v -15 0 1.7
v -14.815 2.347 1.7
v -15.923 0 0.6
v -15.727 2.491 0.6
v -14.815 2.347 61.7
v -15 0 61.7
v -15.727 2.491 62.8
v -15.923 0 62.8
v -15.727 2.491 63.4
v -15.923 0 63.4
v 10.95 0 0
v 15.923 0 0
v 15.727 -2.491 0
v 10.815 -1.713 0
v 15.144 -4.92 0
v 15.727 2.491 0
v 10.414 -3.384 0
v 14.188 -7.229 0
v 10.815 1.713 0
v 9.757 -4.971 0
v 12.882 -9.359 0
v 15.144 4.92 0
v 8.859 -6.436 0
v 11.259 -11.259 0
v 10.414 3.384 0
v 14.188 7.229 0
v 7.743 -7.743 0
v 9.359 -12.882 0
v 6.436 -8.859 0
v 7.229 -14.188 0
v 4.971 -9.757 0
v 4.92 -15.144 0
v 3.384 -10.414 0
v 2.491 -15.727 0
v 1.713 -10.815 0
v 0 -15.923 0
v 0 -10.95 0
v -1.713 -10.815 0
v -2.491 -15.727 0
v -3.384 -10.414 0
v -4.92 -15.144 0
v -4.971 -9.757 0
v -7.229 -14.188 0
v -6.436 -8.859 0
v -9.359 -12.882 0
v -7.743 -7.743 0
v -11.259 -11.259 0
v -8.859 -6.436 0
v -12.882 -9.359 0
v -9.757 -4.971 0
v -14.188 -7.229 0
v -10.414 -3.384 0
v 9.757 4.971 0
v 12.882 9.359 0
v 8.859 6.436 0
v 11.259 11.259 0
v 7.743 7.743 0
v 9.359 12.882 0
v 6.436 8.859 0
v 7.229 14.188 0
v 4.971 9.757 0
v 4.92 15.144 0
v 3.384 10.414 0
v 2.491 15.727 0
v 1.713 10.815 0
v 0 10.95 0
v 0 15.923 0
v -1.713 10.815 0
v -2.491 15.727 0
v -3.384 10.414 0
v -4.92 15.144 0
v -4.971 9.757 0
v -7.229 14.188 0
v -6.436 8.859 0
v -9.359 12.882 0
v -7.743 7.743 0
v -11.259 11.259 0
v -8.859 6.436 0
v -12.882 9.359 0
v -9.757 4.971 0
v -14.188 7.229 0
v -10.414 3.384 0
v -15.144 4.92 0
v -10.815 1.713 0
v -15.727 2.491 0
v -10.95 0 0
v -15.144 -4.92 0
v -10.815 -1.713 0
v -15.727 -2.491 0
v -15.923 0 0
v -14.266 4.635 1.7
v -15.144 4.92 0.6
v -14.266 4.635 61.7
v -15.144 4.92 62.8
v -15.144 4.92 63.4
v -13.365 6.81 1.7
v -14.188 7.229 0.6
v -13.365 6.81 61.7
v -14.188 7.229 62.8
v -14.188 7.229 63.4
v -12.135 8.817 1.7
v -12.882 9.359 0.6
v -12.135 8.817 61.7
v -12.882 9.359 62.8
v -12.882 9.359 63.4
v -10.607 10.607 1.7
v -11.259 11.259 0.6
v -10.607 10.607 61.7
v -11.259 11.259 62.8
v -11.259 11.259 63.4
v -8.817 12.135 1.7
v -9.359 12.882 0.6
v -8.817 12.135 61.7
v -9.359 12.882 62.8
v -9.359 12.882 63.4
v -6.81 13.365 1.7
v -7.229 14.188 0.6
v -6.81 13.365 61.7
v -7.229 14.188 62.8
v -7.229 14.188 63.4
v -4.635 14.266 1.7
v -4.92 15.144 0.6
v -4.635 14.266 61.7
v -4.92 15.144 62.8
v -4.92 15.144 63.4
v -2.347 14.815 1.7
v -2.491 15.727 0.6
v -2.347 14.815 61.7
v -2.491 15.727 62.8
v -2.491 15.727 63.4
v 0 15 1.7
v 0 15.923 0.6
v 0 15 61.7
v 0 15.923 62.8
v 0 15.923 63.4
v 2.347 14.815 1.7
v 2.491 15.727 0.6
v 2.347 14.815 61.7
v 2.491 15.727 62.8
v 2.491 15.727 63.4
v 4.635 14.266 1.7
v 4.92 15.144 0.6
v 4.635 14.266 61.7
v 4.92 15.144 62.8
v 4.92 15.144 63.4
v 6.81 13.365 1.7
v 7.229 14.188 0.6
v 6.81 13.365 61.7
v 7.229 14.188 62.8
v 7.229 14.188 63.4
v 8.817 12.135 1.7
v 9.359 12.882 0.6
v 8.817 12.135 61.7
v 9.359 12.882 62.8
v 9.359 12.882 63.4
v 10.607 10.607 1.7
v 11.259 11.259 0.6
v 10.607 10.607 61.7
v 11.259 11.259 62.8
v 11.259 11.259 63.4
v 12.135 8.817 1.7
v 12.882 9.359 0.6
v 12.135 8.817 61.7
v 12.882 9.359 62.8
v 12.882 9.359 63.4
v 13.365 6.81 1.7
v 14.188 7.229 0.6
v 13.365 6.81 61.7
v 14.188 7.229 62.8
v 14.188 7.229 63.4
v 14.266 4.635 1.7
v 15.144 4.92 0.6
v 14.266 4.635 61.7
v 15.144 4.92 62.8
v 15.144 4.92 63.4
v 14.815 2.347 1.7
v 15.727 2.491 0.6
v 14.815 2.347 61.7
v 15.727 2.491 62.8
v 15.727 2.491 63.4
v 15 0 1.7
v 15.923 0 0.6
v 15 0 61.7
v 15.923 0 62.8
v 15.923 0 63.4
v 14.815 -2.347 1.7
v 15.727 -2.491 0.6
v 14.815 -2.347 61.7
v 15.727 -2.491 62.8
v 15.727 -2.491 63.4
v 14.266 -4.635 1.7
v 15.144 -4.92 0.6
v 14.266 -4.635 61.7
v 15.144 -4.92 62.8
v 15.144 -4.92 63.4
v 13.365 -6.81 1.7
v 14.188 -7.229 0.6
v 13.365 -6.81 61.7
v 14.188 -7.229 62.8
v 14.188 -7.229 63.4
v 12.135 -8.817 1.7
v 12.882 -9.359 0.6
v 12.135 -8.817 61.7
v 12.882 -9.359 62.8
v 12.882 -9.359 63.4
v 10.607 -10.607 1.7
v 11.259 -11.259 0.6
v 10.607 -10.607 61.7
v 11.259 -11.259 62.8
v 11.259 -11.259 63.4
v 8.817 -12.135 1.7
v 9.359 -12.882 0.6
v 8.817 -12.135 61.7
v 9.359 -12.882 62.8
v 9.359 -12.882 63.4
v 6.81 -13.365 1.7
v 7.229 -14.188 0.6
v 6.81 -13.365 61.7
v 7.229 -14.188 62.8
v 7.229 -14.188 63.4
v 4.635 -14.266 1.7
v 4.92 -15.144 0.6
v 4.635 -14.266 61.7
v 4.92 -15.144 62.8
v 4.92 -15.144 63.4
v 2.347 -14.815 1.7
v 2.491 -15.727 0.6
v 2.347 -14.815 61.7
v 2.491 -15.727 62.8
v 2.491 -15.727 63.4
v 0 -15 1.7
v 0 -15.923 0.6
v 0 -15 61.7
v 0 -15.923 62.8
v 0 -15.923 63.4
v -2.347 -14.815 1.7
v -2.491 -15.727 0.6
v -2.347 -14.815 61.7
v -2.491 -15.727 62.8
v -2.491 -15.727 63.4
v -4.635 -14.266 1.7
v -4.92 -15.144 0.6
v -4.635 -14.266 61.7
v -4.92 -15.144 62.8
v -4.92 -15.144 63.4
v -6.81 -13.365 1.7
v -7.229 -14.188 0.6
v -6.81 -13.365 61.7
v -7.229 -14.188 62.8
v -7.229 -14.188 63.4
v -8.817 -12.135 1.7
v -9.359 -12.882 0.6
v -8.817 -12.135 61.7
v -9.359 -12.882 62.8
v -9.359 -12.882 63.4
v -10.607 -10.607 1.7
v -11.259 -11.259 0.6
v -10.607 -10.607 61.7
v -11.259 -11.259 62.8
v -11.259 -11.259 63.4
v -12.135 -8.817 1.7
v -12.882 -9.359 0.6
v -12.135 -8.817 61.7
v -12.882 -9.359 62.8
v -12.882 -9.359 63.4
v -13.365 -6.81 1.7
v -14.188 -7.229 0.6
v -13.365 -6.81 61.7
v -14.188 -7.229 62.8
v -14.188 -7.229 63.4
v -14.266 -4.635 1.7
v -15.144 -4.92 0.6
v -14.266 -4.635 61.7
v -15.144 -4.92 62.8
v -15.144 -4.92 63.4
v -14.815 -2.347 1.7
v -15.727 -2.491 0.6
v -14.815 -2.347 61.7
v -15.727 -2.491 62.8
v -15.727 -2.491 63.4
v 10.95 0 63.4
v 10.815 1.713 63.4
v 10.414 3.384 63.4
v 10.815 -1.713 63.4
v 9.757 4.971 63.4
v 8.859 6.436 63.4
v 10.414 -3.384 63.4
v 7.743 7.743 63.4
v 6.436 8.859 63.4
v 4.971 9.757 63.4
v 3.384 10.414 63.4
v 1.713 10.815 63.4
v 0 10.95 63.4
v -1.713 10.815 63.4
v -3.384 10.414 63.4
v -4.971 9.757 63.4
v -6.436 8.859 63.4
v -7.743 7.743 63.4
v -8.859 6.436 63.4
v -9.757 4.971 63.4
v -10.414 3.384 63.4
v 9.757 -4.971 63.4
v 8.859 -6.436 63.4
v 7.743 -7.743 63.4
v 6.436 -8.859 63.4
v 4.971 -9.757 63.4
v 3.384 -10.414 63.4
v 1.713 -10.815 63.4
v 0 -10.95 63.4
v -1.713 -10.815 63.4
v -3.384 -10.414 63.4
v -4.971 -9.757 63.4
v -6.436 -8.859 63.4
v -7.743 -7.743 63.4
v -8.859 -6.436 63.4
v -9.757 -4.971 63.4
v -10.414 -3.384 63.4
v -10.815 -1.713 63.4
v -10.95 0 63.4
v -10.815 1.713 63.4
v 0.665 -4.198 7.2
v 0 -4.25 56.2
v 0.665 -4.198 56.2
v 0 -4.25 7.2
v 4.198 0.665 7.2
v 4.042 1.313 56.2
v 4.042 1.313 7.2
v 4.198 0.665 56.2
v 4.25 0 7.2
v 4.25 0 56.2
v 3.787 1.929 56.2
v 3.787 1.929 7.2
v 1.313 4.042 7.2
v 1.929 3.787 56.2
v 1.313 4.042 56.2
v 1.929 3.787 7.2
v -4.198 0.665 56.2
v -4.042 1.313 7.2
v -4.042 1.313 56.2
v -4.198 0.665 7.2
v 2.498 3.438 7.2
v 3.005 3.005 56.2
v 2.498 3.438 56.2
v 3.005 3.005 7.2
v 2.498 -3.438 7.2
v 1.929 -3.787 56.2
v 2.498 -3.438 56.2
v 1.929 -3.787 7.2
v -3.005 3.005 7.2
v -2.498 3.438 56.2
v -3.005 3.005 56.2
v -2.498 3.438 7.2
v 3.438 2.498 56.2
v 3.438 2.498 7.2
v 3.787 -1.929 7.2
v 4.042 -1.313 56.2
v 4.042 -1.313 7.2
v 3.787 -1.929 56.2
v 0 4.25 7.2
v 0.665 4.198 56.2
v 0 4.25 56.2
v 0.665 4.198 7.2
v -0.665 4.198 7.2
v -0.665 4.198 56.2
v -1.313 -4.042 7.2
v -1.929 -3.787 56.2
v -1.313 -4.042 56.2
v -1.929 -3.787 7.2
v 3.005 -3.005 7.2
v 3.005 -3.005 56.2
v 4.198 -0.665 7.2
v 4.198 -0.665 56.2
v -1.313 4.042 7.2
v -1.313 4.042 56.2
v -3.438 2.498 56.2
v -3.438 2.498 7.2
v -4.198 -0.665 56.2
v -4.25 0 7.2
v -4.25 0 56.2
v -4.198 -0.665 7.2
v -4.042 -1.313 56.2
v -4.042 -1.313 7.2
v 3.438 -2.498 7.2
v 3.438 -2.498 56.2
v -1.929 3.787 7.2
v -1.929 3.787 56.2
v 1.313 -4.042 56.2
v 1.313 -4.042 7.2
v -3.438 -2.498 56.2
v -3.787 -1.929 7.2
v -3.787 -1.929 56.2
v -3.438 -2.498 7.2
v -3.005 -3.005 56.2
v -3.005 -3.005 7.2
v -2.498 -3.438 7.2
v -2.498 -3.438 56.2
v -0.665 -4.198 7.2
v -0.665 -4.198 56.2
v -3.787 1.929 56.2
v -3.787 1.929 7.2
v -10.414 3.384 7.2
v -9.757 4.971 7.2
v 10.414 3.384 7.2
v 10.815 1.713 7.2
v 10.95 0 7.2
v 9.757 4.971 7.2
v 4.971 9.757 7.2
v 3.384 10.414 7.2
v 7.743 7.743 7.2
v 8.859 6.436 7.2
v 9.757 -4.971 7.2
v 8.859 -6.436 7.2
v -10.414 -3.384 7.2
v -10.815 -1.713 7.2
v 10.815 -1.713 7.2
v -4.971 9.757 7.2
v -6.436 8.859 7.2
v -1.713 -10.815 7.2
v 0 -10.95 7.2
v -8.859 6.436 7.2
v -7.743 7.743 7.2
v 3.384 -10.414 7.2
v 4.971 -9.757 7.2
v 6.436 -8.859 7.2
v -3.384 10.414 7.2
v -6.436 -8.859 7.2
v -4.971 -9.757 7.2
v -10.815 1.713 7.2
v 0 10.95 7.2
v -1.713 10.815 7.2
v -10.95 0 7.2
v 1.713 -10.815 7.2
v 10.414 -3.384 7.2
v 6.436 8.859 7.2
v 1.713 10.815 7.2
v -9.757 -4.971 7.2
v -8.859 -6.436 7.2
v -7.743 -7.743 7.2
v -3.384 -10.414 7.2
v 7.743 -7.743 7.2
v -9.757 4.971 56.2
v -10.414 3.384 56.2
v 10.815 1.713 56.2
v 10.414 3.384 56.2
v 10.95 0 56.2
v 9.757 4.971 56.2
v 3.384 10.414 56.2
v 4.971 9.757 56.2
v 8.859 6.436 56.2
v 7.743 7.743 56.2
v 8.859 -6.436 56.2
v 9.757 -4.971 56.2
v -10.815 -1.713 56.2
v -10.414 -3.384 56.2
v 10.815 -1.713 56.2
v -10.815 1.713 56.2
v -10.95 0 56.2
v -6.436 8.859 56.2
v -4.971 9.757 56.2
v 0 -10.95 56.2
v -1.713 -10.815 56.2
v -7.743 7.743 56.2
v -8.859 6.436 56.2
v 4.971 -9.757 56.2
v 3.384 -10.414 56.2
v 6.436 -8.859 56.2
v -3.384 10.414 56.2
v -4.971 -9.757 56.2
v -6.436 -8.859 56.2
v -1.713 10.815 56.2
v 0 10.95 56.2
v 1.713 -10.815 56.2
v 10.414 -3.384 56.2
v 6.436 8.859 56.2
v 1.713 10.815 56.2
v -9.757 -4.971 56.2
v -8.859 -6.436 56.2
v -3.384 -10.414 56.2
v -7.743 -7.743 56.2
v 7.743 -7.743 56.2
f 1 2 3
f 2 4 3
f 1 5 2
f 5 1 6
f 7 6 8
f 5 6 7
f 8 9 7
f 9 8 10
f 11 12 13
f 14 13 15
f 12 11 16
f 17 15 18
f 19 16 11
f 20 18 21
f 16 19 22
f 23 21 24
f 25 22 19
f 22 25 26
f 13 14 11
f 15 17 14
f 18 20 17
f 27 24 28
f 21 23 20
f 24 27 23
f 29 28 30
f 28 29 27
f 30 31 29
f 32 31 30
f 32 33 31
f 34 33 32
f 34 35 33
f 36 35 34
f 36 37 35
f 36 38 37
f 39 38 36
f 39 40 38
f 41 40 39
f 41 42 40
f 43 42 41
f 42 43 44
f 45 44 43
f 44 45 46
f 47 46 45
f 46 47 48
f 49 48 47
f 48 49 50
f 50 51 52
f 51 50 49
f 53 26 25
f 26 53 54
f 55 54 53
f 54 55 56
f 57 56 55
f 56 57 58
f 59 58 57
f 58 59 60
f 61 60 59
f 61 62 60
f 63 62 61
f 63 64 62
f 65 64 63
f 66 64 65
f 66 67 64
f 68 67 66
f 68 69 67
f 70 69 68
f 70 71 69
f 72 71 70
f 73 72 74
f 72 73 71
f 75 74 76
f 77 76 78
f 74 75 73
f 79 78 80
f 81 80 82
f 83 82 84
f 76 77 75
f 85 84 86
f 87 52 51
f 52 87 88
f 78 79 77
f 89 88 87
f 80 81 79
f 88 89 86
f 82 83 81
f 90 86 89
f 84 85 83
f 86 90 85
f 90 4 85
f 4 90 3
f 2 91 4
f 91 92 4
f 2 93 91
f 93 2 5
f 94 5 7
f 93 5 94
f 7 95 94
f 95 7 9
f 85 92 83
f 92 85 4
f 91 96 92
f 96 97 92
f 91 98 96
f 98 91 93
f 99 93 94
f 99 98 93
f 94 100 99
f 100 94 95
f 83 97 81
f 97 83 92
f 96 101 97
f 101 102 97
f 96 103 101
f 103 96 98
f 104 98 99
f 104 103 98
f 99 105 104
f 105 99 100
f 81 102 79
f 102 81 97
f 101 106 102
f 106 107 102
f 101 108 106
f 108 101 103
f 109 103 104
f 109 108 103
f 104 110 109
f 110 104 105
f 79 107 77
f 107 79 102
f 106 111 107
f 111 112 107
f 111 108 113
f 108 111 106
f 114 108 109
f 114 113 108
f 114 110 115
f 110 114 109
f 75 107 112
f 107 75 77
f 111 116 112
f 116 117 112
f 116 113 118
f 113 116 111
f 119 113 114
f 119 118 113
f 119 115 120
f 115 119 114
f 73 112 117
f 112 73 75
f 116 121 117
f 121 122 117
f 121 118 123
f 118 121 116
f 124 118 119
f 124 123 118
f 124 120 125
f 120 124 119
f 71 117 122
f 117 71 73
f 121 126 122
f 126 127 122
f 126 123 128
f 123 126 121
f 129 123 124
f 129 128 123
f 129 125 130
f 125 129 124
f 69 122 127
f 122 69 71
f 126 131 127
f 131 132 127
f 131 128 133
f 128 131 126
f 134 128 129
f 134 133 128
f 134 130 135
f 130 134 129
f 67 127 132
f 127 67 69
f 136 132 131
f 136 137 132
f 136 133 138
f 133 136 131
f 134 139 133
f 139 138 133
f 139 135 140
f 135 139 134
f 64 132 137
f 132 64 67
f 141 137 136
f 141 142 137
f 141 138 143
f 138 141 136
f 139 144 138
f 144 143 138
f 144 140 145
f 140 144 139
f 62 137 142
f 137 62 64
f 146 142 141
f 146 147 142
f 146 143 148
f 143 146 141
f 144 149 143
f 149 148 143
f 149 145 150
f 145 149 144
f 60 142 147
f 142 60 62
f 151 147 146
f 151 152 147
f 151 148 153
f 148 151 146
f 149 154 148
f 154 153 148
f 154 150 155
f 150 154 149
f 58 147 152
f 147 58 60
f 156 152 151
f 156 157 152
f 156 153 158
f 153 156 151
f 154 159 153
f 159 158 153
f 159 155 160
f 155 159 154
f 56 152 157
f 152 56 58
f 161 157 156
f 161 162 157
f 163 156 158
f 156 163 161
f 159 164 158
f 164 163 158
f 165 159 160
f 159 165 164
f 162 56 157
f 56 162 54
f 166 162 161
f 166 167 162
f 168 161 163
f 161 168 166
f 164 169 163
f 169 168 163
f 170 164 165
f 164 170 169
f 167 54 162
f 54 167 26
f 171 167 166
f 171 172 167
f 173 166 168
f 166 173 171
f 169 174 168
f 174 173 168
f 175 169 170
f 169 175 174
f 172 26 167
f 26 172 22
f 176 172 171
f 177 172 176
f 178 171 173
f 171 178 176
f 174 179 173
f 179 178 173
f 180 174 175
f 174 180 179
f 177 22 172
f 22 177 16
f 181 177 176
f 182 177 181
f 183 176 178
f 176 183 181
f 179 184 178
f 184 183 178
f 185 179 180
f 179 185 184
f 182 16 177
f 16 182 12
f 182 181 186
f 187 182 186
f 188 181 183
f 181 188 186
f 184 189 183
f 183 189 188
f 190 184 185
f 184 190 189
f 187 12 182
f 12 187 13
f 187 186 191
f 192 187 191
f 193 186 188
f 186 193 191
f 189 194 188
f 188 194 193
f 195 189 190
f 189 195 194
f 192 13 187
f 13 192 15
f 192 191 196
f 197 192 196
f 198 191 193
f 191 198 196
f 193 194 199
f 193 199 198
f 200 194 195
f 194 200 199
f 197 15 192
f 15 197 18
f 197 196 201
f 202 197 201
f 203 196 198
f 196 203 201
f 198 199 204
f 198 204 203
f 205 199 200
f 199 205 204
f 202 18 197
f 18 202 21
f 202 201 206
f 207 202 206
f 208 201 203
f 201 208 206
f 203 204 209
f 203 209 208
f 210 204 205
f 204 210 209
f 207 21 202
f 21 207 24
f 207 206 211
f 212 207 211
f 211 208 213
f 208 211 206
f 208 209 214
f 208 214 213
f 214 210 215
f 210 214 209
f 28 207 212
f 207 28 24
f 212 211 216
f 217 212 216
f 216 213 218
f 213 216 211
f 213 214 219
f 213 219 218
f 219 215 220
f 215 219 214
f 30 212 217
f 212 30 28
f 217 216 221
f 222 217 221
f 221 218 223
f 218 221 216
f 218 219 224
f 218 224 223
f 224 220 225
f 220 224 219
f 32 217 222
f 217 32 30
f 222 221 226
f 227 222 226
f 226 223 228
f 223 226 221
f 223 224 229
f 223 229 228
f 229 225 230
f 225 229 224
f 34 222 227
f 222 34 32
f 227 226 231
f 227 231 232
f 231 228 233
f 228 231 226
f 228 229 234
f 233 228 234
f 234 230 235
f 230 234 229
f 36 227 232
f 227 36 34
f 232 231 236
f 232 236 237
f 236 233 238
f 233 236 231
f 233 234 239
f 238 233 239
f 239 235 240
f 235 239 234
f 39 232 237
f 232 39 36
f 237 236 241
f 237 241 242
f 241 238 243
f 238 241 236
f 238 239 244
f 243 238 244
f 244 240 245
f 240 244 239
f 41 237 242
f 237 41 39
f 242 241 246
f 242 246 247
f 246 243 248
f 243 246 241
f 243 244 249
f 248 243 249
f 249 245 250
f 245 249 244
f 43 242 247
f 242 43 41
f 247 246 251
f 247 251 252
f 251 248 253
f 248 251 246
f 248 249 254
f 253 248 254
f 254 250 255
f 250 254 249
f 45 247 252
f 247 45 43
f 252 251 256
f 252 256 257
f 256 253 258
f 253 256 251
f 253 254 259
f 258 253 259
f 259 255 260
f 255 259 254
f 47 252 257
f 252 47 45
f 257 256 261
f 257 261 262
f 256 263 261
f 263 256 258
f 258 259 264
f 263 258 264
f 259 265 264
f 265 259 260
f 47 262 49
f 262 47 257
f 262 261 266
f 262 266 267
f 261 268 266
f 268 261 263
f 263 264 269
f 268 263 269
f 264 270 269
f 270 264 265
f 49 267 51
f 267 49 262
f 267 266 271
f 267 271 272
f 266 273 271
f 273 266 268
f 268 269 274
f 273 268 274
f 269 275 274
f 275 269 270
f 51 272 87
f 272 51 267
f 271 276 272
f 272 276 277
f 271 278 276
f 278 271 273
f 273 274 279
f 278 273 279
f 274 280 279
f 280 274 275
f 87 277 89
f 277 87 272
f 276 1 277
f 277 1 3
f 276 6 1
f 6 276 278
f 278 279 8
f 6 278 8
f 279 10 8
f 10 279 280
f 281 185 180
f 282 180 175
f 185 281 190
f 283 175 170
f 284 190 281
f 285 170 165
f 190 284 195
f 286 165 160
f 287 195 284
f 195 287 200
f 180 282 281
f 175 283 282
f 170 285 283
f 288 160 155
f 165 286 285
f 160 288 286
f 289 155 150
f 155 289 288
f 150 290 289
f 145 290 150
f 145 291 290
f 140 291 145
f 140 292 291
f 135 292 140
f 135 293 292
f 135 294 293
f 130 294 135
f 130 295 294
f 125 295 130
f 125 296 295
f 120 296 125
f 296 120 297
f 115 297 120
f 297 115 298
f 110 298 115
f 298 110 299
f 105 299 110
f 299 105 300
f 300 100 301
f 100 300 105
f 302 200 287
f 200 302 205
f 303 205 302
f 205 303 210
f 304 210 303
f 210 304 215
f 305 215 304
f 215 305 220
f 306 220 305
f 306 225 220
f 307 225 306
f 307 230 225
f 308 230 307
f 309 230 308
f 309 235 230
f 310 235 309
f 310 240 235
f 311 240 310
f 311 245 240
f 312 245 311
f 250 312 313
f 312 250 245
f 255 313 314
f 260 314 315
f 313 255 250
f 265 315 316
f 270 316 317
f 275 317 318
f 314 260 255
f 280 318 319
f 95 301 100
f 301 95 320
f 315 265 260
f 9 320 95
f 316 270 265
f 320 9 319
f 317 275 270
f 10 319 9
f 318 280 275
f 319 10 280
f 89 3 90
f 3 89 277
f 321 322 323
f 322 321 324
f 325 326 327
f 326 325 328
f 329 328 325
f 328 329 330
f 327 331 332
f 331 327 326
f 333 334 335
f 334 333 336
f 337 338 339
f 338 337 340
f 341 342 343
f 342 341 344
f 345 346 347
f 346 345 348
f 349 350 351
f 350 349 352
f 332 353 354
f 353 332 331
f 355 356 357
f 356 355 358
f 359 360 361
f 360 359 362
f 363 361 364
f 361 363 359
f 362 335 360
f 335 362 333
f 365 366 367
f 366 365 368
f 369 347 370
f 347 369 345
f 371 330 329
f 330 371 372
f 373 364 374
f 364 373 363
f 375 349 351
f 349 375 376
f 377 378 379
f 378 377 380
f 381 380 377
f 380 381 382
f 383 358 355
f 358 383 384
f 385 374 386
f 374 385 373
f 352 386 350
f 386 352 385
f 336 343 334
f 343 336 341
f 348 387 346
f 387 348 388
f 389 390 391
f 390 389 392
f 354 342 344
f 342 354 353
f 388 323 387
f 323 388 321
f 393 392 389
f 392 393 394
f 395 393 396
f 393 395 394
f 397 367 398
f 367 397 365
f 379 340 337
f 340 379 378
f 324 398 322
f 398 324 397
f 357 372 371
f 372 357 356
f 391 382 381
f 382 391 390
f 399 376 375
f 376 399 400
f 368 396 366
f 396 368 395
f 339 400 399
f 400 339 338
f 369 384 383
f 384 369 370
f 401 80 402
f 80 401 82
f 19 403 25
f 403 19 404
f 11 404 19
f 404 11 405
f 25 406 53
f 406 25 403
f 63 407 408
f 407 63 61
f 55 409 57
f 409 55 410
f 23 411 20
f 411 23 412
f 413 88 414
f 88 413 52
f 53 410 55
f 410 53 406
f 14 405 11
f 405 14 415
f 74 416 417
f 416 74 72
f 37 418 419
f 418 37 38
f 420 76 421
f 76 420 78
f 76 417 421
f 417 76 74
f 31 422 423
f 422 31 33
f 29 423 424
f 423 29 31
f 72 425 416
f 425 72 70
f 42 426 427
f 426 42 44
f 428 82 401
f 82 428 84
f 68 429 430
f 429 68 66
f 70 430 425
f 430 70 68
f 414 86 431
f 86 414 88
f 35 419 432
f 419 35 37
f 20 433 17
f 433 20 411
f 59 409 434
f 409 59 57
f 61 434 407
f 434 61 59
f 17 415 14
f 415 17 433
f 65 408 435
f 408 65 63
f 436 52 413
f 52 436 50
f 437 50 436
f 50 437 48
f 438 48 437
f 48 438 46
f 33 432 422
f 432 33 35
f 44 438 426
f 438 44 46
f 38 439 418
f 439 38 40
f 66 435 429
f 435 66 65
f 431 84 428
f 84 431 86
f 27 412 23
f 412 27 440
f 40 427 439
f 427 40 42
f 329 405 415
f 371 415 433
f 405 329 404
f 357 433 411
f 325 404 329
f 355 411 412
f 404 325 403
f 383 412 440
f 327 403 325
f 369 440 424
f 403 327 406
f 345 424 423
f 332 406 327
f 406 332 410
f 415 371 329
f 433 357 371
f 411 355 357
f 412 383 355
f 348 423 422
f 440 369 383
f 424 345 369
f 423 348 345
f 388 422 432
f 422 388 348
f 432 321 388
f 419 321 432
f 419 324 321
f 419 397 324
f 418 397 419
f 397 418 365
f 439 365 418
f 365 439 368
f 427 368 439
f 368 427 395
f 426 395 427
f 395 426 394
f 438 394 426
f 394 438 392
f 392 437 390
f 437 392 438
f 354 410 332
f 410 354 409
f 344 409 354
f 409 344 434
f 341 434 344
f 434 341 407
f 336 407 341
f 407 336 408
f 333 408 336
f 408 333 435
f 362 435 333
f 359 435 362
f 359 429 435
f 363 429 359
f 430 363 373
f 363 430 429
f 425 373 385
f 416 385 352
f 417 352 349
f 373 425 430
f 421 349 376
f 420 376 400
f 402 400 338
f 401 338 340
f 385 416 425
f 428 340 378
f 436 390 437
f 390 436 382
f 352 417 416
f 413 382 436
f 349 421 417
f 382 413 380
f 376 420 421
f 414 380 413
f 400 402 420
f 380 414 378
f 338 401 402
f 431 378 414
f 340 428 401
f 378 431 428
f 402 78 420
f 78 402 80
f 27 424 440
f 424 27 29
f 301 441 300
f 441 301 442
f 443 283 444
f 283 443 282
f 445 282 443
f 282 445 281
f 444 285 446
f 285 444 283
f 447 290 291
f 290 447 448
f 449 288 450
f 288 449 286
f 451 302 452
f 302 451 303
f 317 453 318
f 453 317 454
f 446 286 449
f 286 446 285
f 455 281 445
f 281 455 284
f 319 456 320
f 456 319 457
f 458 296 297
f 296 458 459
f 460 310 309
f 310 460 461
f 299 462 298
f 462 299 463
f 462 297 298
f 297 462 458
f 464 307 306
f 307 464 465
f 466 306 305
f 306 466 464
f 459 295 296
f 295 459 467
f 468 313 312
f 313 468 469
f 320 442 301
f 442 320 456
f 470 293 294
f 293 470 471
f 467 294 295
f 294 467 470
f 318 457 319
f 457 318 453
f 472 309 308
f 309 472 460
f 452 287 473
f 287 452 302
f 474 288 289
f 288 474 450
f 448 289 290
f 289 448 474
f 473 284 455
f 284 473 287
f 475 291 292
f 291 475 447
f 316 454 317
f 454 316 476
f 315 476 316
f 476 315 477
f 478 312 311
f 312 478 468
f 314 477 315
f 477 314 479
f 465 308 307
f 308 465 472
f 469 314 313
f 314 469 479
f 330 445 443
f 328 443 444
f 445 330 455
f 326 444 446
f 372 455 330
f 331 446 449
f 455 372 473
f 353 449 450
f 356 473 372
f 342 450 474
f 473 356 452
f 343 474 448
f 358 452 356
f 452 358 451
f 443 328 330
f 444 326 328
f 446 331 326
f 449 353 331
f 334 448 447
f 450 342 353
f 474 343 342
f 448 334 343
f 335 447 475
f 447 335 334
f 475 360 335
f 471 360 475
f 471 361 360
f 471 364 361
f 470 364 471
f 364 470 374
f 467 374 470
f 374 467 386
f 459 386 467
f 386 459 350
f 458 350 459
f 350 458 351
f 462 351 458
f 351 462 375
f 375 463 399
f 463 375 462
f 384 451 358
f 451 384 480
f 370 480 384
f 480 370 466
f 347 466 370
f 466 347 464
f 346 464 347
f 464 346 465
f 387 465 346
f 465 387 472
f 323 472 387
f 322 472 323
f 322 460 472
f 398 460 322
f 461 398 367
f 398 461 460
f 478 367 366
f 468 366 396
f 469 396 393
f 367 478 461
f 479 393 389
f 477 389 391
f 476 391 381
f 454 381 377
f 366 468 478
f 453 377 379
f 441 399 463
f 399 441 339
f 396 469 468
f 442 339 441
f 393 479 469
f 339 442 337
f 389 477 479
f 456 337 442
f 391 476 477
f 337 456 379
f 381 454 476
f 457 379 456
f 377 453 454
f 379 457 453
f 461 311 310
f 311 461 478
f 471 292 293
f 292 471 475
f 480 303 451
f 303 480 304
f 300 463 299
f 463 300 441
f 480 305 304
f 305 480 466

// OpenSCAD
include <../lib/filament-spool-roller-lib.scad>;
$fn = 40;
roller();
